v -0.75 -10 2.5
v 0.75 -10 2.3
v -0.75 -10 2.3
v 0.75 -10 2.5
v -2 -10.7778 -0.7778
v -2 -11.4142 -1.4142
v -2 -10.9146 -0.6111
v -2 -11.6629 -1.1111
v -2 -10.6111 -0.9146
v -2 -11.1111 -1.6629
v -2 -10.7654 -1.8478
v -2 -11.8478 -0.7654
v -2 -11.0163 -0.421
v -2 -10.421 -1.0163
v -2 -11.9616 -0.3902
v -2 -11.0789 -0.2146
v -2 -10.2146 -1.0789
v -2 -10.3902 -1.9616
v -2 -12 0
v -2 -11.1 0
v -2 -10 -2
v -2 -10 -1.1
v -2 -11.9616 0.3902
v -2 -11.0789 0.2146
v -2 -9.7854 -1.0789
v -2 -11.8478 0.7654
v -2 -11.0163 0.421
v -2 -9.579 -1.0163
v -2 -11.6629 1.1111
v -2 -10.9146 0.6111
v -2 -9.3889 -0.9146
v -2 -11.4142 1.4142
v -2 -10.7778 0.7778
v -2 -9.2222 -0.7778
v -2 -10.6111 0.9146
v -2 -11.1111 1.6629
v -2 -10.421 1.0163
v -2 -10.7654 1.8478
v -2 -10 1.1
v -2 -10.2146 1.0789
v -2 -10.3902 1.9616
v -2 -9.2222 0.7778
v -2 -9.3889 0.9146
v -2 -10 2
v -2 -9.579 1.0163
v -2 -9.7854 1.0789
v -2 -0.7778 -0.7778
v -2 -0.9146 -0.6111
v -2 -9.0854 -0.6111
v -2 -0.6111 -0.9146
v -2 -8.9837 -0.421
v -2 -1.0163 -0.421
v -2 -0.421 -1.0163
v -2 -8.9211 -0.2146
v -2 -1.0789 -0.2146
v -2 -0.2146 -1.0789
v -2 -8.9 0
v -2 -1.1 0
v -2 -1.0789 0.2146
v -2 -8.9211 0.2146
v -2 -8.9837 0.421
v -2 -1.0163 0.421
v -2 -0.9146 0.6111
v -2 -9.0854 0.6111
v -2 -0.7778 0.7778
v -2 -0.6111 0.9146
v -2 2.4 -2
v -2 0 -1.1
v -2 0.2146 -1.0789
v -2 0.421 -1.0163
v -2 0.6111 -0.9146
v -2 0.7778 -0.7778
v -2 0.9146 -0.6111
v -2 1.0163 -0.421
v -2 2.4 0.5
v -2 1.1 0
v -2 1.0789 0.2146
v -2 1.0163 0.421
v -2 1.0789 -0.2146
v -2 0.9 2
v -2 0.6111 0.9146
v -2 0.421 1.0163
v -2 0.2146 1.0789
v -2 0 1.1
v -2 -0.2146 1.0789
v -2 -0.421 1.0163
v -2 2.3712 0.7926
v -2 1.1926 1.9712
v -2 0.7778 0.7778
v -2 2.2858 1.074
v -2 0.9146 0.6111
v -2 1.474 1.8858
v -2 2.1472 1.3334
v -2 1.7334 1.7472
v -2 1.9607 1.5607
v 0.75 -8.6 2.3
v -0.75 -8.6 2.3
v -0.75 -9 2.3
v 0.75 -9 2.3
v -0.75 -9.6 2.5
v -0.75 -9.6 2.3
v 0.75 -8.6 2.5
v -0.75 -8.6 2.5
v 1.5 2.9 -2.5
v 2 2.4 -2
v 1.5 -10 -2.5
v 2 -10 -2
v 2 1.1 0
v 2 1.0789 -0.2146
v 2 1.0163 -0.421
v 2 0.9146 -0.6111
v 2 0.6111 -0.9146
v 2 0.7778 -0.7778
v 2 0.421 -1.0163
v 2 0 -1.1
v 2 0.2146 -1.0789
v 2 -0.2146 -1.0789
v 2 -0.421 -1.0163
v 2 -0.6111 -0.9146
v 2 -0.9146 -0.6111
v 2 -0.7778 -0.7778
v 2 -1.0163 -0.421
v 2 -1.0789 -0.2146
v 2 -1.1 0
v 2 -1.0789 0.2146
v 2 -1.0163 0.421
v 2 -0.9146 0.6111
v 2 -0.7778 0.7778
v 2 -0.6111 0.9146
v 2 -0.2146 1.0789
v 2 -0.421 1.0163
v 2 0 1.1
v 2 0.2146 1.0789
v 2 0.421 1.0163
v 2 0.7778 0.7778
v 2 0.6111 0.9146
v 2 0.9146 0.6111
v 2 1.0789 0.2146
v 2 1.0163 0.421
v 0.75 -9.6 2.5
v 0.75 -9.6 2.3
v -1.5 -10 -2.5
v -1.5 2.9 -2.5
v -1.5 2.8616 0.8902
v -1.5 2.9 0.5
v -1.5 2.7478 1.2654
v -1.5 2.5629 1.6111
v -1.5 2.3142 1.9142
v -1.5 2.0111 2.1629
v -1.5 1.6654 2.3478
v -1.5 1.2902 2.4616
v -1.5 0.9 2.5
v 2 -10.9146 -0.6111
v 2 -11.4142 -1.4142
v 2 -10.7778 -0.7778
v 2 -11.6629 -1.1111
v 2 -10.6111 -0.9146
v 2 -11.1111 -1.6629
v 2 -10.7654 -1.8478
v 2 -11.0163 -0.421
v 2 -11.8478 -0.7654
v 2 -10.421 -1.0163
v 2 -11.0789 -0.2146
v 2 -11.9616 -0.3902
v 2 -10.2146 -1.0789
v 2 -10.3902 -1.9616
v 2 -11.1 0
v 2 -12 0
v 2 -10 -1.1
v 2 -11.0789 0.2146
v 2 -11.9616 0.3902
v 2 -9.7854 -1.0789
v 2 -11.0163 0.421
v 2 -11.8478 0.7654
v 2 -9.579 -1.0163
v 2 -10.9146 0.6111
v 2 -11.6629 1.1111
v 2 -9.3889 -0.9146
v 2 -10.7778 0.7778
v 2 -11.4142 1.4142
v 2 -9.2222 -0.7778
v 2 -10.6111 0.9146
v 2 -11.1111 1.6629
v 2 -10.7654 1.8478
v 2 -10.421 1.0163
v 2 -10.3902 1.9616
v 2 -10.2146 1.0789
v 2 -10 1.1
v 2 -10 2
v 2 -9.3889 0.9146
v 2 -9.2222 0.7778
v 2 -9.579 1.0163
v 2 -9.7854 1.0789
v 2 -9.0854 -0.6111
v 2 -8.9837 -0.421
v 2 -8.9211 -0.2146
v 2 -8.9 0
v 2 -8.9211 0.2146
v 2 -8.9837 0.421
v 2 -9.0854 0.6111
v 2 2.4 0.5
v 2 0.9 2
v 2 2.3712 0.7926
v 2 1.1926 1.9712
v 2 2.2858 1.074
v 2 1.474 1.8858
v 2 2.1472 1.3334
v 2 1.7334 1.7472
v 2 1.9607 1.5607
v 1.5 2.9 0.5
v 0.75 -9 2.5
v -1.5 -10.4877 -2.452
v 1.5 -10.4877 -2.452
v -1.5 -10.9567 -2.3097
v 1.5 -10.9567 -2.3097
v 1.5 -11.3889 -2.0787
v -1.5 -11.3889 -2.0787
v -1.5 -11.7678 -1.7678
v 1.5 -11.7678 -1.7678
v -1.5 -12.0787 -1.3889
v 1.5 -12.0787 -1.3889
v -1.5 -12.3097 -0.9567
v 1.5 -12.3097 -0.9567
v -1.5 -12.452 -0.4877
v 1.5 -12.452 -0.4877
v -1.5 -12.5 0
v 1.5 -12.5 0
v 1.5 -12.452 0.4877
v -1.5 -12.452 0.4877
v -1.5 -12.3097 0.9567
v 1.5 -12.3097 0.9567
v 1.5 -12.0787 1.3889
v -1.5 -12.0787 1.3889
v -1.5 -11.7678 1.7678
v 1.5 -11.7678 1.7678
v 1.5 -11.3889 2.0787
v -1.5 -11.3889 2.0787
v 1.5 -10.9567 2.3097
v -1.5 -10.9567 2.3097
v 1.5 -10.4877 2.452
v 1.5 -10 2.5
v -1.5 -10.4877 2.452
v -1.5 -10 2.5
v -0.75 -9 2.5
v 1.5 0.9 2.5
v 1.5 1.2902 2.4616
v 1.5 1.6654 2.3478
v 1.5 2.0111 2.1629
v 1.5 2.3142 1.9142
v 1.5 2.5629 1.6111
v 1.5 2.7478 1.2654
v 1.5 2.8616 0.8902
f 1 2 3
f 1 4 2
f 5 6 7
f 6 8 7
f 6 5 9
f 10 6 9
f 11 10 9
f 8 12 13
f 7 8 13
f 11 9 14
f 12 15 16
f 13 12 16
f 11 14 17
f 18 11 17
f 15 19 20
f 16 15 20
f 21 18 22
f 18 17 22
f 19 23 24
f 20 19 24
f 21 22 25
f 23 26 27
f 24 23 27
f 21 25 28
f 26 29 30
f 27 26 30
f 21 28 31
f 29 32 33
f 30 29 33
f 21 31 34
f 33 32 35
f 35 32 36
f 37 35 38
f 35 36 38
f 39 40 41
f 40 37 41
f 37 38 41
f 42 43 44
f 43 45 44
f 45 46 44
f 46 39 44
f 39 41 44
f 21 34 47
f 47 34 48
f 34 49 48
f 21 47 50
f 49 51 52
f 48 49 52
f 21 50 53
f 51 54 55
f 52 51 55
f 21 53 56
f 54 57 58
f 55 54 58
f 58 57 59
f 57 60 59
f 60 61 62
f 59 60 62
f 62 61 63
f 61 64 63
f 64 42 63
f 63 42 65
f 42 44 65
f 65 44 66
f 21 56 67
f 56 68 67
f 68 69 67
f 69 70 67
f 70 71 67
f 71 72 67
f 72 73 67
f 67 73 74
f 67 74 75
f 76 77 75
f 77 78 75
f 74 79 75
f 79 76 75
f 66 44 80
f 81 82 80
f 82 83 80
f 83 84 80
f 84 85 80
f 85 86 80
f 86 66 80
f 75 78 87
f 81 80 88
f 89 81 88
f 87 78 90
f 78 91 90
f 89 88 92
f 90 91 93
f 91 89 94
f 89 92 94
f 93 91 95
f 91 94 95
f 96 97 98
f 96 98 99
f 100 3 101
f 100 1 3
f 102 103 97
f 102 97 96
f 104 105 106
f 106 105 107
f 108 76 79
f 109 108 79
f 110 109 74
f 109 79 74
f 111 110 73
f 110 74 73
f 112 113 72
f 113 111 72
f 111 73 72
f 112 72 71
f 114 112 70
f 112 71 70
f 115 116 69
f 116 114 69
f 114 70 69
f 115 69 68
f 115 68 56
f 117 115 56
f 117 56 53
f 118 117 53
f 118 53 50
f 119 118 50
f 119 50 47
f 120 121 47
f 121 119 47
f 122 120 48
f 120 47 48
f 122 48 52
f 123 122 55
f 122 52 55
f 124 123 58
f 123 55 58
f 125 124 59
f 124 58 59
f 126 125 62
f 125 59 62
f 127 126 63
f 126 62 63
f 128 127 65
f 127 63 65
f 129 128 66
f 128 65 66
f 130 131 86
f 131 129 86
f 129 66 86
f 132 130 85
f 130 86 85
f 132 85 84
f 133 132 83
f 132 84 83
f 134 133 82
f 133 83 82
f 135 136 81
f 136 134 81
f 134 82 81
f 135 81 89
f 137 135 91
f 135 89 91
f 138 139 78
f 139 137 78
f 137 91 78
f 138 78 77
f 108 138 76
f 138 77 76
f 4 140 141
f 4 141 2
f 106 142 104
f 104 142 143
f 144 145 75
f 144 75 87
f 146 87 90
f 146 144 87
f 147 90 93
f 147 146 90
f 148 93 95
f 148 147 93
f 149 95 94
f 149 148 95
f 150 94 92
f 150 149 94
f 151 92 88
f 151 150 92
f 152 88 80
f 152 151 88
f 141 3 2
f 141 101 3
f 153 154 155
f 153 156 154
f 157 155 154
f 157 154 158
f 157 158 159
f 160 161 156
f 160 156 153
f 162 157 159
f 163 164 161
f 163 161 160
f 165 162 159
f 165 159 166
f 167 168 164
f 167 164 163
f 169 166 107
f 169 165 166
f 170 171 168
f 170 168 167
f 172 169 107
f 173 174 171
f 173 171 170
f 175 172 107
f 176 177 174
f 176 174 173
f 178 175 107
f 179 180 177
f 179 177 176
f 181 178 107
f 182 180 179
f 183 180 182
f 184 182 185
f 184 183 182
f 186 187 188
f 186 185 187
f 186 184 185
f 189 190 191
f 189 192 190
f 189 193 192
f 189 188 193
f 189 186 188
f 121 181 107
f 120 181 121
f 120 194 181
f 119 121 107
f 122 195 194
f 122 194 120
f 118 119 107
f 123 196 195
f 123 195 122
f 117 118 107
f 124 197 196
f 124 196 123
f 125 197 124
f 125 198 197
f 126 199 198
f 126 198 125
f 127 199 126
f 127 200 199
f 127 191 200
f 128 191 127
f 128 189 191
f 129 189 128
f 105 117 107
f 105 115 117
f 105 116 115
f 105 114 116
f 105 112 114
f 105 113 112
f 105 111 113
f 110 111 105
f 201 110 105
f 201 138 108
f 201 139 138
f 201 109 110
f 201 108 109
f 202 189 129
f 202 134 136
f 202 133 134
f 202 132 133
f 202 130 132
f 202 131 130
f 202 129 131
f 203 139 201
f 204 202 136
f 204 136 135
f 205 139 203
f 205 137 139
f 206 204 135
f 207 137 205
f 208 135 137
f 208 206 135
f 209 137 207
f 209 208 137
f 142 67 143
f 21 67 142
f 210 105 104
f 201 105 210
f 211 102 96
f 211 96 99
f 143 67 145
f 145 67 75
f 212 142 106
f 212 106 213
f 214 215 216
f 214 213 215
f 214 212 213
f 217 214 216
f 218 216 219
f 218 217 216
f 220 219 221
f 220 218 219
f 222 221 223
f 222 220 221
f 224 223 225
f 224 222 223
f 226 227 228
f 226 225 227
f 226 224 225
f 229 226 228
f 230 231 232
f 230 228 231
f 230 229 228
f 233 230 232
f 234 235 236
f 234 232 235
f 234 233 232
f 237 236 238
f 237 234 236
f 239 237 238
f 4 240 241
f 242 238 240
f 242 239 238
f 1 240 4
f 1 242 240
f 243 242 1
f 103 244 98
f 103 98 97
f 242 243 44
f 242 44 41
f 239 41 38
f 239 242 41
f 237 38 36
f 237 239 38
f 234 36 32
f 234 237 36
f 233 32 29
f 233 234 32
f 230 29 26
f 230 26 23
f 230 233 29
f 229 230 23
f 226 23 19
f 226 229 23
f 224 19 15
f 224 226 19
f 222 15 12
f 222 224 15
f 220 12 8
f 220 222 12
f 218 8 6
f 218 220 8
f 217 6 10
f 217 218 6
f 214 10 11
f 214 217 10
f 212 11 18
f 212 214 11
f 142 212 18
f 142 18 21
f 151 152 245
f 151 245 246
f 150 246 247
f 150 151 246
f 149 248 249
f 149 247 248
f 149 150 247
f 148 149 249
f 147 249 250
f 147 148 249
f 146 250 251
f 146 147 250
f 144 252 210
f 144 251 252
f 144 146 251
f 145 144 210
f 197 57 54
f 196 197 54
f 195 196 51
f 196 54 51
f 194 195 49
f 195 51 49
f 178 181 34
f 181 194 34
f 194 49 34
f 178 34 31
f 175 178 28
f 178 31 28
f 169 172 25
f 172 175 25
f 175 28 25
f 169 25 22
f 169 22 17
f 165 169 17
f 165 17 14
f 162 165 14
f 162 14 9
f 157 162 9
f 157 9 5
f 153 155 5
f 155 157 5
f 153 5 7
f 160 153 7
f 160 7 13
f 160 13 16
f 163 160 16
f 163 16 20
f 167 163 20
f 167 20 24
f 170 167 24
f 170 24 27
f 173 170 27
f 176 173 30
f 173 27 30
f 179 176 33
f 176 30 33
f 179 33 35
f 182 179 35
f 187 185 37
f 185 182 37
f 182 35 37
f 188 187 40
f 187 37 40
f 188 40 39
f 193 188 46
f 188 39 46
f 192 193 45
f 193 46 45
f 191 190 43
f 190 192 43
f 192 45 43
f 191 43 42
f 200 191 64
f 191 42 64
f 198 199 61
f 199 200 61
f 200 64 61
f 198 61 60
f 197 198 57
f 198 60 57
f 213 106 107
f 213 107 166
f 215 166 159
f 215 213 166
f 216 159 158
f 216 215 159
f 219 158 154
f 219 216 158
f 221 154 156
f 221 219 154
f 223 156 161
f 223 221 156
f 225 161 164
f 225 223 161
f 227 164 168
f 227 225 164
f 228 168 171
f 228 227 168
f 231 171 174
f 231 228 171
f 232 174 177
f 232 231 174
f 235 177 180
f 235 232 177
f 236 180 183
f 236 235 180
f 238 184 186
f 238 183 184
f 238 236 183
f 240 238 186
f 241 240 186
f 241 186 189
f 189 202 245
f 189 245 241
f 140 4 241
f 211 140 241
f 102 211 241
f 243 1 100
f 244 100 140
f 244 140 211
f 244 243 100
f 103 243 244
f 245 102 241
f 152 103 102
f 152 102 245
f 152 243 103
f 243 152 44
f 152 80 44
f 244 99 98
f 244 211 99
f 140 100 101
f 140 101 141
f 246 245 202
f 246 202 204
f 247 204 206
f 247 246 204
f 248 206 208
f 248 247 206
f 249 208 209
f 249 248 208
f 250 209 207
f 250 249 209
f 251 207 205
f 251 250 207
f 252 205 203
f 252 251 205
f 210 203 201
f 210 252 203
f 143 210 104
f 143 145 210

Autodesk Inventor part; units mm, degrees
ref_plane "YZ Plane" through (0, 0, 0) normal (1, 0, 0) x (0, 1, 0)
ref_plane "XZ Plane" through (0, 0, 0) normal (0, 1, 0) x (-1, 0, 0)
ref_plane "XY Plane" through (0, 0, 0) normal (0, 0, 1) x (1, 0, 0)
sketch "Skizze1" plane through (0, 0, 0) normal (1, 0, 0) x (0, 1, 0)
  line L0 (0, 0) -> (-10, 0) construction
  circle A0 centre (0, 0) radius 1.1
  circle A1 centre (-10, 0) radius 1.1
  arc A2 (-10, 2.5) -> (-10, -2.5) centre (-10, 0) ccw
  line L1 (-10, -2.5) -> (2.9, -2.5)
  line L2 (-10, 2.5) -> (0.9, 2.5)
  arc A3 (2.9, 0.5) -> (0.9, 2.5) centre (0.9, 0.5) ccw
  line L3 (2.9, 0.5) -> (2.9, -2.5)
  dimension "d0" = 10
  dimension "d1" = 2.2
  dimension "d2" = 2.2
  dimension "d3" = 2.5
  dimension "d8" = 2
  dimension "d9" = 2.9
extrude "Extrusion1" add sketch "Skizze1" along normal mid plane 4
chamfer "Fase1" distance 0.5 angle 45 10 edges at (2, 2.3142, 1.9142) (2, -4.55, 2.5) (2, -12.5, 0) (2, -3.55, -2.5) (2, 2.9, -1) (-2, 2.3142, 1.9142) (-2, -4.55, 2.5) (-2, -12.5, 0) (-2, -3.55, -2.5) (-2, 2.9, -1)
sketch "Skizze4" plane through (-1.5, -10, 2.5) normal (0, 0, 1) x (1, 0, 0)
  line L0 (1.5, 15.98) -> (1.5, -5.58) construction
  line L1 (0, 0) -> (3, 0) construction
  line L2 (0.75, 0.4) -> (2.25, 0.4)
  line L3 (2.25, 0.4) -> (2.25, 0)
  line L4 (2.25, 0) -> (0.75, 0)
  line L5 (0.75, 0) -> (0.75, 0.4)
  line L6 (0.75, 0.4) -> (2.25, 0) construction
  line L7 (2.25, 0.4) -> (0.75, 0) construction
  point P0 (1.5, 10)
  point P1 (1.5, 0.2)
  point P2 (1.5, 0)
  dimension "d23" = 0.4
  dimension "d24" = 1.5
extrude "Extrusion3" cut sketch "Skizze4" against normal blind 0.2
pattern_linear "Rechteckige Anordnung1" count 2 spacing 1 along (0, 1, 0) of "Extrusion3"
equation "\"d2\" = d1"
properties part number "Chipanschlag T1"
